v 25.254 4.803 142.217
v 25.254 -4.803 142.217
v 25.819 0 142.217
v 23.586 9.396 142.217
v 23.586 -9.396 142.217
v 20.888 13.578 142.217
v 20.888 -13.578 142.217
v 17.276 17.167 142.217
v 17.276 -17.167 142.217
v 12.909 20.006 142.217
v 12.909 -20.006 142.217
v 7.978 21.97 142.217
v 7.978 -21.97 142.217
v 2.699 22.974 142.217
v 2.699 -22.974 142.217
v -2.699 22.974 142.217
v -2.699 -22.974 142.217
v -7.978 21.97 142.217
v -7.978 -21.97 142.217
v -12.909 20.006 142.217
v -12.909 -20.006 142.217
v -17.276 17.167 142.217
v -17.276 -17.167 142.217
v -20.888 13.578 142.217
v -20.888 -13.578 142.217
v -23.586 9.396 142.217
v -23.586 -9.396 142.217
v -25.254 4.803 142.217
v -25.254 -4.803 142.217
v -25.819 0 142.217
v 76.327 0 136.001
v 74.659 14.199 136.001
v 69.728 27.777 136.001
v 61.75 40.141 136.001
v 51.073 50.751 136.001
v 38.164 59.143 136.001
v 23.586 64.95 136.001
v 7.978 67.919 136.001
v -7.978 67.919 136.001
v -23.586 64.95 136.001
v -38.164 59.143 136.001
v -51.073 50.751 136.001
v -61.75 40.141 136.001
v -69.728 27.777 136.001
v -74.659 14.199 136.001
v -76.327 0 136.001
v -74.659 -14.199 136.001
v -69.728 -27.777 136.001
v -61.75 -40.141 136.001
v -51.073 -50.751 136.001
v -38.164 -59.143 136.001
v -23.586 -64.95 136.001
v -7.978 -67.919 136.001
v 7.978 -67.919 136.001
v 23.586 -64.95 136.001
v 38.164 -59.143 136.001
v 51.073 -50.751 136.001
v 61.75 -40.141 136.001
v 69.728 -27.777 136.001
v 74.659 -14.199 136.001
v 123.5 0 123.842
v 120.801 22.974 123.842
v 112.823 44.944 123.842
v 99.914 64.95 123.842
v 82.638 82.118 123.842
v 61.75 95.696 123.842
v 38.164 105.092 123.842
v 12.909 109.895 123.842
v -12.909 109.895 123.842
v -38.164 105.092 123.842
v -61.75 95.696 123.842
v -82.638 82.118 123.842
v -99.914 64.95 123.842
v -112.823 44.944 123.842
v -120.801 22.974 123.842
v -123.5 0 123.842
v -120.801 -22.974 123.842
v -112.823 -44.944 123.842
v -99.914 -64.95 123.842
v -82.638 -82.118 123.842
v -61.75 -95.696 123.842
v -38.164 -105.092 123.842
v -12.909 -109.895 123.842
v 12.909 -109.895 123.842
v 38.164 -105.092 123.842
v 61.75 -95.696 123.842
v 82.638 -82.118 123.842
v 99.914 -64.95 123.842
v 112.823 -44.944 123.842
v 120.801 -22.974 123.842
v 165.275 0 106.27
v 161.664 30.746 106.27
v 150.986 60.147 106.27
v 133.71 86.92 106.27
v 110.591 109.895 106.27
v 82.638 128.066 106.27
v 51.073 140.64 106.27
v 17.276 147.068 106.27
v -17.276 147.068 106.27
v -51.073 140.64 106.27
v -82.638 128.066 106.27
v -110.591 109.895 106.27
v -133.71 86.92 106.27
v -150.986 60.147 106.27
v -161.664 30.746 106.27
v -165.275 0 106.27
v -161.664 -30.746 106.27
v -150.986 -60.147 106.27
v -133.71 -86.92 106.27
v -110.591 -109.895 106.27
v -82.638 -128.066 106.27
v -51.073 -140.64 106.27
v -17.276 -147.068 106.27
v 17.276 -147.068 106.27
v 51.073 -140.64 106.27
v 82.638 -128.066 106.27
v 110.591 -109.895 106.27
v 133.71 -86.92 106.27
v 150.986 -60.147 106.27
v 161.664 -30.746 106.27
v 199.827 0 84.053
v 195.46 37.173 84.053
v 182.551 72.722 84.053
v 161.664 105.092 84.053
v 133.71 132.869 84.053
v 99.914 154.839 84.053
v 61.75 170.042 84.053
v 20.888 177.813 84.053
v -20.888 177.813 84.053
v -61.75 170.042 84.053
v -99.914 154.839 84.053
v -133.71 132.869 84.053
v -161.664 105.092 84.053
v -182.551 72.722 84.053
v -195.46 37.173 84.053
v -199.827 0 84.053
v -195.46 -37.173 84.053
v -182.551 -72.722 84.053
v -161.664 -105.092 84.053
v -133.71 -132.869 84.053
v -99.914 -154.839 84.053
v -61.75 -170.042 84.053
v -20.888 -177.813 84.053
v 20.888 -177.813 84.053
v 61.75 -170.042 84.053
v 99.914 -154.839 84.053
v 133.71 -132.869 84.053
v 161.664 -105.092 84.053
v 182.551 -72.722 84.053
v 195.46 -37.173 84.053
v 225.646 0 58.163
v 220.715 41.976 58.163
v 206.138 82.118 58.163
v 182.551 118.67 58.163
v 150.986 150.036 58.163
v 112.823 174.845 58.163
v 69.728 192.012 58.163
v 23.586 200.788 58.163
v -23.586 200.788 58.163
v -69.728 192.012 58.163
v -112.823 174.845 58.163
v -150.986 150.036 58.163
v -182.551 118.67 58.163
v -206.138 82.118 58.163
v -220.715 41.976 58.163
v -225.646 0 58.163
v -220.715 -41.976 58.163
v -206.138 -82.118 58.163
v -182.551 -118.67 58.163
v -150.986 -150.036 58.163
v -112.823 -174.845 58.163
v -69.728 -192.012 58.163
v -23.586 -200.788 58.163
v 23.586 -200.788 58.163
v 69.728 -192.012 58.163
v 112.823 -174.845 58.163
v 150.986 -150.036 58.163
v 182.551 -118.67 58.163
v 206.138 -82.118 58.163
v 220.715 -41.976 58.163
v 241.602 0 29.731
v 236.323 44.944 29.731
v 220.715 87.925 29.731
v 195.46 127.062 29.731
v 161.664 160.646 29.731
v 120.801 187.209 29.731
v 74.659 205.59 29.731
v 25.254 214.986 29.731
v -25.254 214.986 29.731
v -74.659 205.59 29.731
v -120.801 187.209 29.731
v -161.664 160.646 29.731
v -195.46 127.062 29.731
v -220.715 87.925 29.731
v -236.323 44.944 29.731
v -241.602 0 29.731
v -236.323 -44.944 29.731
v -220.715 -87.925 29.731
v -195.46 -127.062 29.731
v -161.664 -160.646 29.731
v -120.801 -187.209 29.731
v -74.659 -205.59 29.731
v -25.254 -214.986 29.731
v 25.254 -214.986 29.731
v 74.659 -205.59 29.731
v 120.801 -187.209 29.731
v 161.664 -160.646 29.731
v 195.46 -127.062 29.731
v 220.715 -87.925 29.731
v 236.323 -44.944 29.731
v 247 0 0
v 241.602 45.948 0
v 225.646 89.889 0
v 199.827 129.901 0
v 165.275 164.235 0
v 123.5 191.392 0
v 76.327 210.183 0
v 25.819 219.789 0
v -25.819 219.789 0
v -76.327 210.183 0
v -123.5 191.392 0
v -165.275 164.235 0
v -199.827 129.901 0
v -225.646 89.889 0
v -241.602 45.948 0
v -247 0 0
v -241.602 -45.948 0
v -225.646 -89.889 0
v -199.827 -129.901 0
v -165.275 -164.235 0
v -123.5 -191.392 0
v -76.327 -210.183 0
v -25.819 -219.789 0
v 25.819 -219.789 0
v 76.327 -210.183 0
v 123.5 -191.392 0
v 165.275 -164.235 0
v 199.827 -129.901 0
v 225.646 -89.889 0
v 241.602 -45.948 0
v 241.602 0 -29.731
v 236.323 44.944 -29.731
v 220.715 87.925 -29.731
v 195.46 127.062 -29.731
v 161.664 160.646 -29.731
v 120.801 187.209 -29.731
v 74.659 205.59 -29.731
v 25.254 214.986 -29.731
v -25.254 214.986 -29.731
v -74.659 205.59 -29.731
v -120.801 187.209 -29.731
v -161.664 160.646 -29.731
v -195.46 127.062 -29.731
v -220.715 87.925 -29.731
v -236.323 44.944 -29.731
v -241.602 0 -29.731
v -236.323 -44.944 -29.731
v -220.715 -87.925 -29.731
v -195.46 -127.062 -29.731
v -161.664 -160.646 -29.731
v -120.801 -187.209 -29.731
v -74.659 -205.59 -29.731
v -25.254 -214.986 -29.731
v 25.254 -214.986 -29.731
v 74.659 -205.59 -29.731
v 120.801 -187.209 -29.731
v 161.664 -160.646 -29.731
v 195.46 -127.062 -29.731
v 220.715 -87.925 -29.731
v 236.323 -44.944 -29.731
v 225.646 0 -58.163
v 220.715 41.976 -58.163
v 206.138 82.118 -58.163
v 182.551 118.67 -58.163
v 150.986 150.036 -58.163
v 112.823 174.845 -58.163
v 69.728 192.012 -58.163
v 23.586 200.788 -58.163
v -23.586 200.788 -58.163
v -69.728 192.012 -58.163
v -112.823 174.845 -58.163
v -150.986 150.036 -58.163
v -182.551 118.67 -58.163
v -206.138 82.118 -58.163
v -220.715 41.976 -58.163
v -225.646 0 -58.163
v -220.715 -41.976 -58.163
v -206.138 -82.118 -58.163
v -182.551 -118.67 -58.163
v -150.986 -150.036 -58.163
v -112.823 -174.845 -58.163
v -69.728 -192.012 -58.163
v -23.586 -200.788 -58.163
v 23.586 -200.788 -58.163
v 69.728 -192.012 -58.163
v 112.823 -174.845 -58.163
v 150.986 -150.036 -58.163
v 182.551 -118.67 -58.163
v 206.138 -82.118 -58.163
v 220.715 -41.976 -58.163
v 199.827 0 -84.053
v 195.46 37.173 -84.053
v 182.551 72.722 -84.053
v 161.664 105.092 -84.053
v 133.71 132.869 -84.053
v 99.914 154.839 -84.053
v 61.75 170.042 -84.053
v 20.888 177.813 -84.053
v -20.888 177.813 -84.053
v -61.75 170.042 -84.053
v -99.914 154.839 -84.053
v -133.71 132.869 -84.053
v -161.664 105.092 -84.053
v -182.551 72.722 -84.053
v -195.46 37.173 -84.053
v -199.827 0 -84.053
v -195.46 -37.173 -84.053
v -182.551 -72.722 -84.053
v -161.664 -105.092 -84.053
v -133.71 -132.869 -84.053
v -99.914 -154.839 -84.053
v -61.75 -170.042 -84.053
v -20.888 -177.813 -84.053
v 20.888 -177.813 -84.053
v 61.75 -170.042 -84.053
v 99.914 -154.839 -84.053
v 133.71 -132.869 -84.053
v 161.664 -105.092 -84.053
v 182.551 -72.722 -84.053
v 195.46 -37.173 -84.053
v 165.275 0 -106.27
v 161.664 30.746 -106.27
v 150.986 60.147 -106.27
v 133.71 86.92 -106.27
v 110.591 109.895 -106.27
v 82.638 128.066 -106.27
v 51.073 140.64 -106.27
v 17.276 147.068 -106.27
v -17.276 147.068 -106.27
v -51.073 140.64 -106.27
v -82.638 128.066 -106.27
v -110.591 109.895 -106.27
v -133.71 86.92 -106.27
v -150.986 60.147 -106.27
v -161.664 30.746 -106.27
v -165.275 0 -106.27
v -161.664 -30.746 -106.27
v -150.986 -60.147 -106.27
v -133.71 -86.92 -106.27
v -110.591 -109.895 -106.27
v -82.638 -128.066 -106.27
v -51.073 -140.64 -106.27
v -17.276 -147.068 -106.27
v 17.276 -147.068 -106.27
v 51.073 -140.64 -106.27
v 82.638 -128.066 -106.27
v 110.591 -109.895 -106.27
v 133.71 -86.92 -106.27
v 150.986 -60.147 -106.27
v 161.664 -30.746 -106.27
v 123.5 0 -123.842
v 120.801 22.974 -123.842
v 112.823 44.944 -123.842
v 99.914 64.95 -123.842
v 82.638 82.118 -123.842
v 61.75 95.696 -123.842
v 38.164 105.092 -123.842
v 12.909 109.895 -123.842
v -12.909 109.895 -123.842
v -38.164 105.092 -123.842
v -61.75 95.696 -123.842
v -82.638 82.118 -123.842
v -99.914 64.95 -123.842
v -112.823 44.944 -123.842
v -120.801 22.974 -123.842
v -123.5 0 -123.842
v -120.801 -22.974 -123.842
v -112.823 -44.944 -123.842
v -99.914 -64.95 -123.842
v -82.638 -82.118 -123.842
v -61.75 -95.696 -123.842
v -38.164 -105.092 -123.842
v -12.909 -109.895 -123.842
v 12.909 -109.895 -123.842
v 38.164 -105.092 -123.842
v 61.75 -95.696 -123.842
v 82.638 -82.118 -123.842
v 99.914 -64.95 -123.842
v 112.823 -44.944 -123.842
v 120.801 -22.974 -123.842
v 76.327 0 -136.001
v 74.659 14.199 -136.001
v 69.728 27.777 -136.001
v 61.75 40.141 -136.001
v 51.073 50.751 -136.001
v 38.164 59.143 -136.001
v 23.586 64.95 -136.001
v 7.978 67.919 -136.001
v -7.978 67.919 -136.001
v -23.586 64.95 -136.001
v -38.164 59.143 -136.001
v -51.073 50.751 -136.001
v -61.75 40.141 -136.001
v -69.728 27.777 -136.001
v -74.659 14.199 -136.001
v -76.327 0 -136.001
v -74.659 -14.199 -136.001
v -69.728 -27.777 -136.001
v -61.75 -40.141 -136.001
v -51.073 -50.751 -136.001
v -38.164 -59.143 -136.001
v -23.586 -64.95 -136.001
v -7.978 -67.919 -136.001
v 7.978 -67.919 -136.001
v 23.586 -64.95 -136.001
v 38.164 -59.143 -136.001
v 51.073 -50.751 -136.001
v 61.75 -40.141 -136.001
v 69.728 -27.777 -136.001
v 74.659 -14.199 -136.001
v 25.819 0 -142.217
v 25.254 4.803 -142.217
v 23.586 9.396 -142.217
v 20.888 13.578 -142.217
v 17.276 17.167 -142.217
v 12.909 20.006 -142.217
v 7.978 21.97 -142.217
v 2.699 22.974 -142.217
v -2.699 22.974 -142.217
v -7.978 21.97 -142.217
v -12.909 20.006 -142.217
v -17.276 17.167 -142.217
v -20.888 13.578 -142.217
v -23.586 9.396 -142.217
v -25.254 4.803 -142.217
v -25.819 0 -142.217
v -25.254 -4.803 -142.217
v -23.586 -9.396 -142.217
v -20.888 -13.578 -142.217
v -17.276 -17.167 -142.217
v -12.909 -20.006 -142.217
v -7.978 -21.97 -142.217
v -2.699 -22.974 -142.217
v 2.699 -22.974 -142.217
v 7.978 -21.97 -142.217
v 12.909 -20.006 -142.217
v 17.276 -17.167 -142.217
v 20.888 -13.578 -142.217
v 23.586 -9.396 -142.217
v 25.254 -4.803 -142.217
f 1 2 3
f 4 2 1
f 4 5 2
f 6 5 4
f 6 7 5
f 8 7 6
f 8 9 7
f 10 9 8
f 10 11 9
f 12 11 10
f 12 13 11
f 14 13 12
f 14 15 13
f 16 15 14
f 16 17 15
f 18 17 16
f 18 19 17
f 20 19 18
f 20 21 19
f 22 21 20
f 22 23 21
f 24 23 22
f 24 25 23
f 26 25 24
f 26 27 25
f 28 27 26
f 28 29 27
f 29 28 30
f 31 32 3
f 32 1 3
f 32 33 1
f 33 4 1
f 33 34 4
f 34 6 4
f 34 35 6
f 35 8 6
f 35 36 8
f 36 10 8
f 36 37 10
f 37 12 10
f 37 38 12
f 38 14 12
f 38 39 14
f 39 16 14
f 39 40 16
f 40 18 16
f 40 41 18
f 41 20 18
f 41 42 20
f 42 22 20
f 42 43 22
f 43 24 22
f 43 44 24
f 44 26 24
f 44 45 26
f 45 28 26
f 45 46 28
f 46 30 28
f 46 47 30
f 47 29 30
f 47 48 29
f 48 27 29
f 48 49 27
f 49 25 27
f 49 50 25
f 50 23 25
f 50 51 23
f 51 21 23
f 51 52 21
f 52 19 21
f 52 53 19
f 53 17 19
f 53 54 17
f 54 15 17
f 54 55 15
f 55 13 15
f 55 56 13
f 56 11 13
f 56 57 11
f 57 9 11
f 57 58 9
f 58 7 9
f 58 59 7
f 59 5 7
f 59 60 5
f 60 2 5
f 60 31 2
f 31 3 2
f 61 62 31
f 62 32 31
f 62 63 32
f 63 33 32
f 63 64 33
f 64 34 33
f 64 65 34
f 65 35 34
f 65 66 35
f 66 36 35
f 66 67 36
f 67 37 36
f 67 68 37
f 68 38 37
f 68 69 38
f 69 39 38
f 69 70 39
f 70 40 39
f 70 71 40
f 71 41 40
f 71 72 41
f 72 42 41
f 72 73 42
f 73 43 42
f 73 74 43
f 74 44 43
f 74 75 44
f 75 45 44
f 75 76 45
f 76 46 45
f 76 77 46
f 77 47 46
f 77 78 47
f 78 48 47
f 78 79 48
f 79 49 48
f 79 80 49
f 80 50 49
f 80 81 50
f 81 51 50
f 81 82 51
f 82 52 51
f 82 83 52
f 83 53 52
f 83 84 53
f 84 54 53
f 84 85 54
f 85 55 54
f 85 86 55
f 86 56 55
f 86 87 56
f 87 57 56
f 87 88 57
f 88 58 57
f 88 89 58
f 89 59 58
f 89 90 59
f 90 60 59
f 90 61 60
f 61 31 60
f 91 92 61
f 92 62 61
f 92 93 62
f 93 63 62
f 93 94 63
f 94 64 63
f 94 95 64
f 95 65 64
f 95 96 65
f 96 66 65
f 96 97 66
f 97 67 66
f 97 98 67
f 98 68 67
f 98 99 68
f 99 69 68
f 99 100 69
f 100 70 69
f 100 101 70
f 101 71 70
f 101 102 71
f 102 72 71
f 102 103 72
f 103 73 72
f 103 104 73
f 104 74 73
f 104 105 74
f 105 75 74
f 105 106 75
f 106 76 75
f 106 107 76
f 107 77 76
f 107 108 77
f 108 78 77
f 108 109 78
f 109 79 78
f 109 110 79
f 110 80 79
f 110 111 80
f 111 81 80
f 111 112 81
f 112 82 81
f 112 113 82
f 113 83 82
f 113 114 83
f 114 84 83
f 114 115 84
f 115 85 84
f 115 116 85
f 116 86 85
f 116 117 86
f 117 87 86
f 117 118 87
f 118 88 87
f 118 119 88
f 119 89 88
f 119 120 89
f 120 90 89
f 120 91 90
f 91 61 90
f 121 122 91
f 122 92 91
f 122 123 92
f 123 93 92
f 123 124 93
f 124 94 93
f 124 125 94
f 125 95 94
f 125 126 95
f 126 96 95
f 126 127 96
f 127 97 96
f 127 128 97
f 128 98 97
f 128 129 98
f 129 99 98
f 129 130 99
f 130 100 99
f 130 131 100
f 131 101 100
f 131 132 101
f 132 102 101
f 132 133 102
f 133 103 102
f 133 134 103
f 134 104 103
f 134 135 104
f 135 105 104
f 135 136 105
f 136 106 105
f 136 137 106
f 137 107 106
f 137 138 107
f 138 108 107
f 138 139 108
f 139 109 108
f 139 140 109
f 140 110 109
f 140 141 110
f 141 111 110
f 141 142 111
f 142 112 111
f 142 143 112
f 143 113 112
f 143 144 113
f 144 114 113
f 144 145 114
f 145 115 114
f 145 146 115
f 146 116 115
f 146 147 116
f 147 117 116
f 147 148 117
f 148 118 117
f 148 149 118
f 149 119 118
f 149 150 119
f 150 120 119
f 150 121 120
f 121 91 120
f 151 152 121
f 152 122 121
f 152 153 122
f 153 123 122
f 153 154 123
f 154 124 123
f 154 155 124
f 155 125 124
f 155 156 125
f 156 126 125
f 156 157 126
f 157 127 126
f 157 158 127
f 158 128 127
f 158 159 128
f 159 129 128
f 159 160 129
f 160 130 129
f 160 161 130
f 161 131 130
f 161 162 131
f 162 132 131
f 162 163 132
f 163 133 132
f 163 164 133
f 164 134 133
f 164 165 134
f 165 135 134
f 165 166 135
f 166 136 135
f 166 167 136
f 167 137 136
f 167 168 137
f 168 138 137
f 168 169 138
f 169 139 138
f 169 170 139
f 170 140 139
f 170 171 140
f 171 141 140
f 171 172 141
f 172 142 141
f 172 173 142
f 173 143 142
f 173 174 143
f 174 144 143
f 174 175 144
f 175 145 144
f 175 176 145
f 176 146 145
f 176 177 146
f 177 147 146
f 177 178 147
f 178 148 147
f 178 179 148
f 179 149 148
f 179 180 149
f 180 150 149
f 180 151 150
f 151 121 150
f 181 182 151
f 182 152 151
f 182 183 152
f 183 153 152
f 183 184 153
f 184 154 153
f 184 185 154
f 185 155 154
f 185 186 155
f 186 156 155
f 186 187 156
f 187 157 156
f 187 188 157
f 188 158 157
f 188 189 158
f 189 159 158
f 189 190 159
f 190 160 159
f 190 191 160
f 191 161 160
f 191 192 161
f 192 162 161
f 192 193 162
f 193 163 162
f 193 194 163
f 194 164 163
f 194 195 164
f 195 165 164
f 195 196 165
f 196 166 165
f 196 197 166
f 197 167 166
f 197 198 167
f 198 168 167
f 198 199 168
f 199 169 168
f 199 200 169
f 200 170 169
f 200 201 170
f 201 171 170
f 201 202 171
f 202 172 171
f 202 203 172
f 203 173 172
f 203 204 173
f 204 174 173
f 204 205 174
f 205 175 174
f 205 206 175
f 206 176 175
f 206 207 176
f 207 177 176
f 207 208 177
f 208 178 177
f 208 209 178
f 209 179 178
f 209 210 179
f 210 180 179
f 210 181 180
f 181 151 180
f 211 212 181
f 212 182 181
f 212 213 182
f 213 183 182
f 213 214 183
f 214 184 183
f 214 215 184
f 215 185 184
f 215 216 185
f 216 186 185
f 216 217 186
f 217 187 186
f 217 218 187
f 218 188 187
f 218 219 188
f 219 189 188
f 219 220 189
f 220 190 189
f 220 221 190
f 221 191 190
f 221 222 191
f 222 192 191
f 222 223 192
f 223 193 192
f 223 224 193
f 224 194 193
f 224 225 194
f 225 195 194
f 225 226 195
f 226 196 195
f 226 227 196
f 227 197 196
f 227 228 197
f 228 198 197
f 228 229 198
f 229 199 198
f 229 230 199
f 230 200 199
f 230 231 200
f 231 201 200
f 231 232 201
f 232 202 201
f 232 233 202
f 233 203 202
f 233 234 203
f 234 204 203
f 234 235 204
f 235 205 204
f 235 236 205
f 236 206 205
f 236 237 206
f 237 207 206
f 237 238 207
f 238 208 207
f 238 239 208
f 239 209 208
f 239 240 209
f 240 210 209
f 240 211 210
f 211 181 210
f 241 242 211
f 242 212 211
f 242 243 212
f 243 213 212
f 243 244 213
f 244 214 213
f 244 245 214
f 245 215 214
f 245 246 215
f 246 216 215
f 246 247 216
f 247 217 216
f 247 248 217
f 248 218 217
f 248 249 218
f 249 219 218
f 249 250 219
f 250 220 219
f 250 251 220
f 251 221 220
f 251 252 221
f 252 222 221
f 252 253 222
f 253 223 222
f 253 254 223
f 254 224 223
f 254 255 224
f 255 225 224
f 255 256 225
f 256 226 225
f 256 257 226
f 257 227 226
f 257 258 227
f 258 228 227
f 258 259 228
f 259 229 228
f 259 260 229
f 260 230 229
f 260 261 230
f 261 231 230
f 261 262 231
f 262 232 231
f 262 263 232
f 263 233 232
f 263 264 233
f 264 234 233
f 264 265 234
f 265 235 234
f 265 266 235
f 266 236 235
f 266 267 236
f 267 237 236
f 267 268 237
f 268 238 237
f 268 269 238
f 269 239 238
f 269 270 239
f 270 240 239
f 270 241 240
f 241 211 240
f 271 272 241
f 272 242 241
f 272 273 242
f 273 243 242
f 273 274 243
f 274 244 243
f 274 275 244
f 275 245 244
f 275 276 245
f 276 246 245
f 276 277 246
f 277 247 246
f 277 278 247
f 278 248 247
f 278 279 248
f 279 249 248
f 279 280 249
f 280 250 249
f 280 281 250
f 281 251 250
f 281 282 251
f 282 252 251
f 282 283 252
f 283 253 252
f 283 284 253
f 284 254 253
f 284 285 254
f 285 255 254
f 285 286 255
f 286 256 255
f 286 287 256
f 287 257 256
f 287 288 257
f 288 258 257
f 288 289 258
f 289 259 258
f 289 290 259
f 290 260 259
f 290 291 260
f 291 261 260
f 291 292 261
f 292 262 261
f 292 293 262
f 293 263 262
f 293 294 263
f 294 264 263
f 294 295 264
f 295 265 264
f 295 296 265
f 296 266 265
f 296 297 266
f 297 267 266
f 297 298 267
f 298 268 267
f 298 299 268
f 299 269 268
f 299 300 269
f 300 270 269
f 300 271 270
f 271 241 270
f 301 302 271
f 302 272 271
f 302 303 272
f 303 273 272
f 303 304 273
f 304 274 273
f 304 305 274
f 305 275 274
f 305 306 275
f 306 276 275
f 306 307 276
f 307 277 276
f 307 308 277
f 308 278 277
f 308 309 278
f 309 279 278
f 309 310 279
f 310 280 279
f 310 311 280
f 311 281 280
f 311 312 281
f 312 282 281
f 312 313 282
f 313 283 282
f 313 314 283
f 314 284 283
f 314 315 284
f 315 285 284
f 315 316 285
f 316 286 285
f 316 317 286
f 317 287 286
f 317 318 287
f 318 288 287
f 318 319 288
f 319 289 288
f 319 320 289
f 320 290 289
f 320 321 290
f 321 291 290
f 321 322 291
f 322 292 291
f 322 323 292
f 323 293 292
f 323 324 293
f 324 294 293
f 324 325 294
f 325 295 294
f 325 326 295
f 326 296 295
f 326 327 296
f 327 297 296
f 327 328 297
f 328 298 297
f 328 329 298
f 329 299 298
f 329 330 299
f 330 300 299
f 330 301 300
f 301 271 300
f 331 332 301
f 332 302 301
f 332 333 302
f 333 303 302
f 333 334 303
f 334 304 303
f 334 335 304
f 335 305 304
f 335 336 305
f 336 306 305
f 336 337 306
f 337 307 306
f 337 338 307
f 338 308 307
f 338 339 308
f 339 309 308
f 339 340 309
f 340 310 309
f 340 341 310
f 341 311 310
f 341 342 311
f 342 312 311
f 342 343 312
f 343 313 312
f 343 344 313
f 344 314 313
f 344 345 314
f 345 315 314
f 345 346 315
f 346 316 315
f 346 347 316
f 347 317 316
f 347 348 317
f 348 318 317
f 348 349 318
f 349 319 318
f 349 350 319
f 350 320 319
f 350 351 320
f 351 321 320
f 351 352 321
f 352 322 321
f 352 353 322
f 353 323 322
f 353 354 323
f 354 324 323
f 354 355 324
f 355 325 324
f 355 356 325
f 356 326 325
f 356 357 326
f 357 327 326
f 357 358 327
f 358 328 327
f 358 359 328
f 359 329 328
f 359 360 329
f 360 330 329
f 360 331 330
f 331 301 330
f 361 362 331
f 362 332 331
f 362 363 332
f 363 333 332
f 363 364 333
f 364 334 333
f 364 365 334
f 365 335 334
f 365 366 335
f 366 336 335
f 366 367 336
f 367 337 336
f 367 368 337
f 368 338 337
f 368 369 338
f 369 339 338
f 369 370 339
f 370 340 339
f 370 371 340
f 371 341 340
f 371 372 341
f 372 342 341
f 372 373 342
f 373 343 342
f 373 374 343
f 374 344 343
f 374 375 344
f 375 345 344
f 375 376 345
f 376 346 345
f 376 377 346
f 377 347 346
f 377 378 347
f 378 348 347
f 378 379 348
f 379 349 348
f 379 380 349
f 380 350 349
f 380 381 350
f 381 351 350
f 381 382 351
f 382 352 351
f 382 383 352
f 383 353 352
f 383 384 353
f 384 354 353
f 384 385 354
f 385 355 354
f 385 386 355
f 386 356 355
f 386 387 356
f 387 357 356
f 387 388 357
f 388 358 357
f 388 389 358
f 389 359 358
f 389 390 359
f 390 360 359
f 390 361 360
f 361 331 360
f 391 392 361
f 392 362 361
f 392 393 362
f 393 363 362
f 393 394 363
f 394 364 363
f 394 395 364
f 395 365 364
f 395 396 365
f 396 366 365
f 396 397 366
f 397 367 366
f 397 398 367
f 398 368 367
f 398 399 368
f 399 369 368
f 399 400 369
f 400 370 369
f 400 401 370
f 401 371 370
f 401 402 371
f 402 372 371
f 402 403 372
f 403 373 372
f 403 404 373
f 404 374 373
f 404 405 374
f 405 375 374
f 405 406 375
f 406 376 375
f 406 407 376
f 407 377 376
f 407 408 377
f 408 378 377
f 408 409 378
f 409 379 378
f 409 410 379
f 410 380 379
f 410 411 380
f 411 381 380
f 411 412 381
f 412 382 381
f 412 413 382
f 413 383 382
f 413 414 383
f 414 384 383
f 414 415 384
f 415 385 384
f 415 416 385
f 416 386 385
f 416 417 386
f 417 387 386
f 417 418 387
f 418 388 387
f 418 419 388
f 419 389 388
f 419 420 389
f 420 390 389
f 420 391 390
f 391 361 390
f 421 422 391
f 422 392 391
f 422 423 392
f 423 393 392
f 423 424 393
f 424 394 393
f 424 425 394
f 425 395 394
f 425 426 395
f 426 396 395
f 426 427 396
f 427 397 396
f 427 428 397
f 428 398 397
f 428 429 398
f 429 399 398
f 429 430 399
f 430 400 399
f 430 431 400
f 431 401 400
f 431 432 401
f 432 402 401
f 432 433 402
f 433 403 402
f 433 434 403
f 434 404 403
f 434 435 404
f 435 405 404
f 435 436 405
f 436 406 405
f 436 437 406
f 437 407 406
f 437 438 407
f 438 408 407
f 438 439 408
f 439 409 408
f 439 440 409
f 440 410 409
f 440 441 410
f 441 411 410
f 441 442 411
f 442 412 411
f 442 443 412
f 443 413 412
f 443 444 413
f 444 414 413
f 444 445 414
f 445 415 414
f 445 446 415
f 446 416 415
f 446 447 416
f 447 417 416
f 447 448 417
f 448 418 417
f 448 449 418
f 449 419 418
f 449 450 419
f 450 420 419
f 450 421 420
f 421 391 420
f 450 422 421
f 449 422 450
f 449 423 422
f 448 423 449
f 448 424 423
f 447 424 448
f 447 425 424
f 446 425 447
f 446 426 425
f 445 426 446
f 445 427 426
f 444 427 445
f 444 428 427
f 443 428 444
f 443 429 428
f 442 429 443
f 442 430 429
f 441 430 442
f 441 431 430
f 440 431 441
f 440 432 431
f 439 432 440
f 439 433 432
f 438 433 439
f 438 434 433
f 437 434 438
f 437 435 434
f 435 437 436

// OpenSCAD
// Generated by SolidPython 1.0.1 on 2020-07-29 00:46:54


scale(v = [19, 17, 11]) {
	sphere(r = 13);
}
/***********************************************
*********      SolidPython code:      **********
************************************************
 
# import packages: SolidPython
from solid import *
from solid.utils import *
from itertools import chain, combinations, permutations


class Resize:

    def __init__(self, scad_file):
        self.scad_file = scad_file
        #self.scad_file = import_scad(scad_file)
        # cone/cylinder param:
        self.r1 = 0
        self.r2 = 0
        self.h = 0
        # rectangular prism param:
        self.w = 0
        self.l = 0
        # ellipse param:
        self.r = 0

    # import OpenScad code (file name corresponds to shape)


    # classify shape + parameters
    def assign(self, param1, param2, param3):
        if self.scad_file == 'cone.scad':
            self.r1 = param1
            self.r2 = param2
            self.h = param3
        elif self.scad_file == 'cylinder.scad':
            self.r1 = param1
            self.r2 = param2
            self.h = param3
        elif self.scad_file == 'rectangularPrism.scad':
            self.h = param1
            self.l = param2
            self.w = param3
        else:
            self.r = param1
            self.h = param2

    # resize parameters
    def iterate(self):
        x = range(3, 20, 2)
        i = 1
        if self.scad_file == 'cone.scad':
            tempList = list(permutations(x, 2))
            for temp in tempList:
                param1 = temp[0]
                param2 = temp[1]
                filepath = 'produced_scad_files/' + 'cone' + str(param1) + '_' + str(param2) + '_' + '.scad'
                scad_render_to_file(cylinder(h=param1, r1=param2, r2=0), filepath)

        elif self.scad_file == 'cylinder.scad':
            tempList = list(permutations(x, 3))
            for temp in tempList:
                param1 = temp[0]
                param2 = temp[1]
                filepath = 'produced_scad_files/' + 'cylinder' + str(param1) + '_' + str(param2) + '_' + '.scad'
                scad_render_to_file(cylinder(h=param1, r1=param2, r2=param2), filepath)

        elif self.scad_file == 'rectangularPrism.scad':
            tempList = list(permutations(x, 3))
            for temp in tempList:
                param1 = temp[0]
                param2 = temp[1]
                param3 = temp[2]
                filepath = 'produced_scad_files/' + 'rectangularPrism' + str(param1) + '_' + str(param2) + '_' + str(
                    param3) + '.scad'
                scad_render_to_file(cube(size=(param1, param2, param3)), filepath)

        elif self.scad_file == 'ellipse.scad':
            tempList = list(permutations(x, 4))
            for temp in tempList:
                param1 = temp[0]
                param2 = temp[1]
                param3 = temp[2]
                param4 = temp[3]
                filepath = 'produced_scad_files/' + 'ellipse' + str(param1) + '_' + str(param2) + '_' + str(param3) + '_' + str(param4) + '.scad'
                scad_render_to_file(scale([param1, param2, param3])(sphere(r=param4)), filepath)

    def render_to_scadfile(self):
        scad_render_to_file(scad, 'example.scad') 
 
************************************************/
